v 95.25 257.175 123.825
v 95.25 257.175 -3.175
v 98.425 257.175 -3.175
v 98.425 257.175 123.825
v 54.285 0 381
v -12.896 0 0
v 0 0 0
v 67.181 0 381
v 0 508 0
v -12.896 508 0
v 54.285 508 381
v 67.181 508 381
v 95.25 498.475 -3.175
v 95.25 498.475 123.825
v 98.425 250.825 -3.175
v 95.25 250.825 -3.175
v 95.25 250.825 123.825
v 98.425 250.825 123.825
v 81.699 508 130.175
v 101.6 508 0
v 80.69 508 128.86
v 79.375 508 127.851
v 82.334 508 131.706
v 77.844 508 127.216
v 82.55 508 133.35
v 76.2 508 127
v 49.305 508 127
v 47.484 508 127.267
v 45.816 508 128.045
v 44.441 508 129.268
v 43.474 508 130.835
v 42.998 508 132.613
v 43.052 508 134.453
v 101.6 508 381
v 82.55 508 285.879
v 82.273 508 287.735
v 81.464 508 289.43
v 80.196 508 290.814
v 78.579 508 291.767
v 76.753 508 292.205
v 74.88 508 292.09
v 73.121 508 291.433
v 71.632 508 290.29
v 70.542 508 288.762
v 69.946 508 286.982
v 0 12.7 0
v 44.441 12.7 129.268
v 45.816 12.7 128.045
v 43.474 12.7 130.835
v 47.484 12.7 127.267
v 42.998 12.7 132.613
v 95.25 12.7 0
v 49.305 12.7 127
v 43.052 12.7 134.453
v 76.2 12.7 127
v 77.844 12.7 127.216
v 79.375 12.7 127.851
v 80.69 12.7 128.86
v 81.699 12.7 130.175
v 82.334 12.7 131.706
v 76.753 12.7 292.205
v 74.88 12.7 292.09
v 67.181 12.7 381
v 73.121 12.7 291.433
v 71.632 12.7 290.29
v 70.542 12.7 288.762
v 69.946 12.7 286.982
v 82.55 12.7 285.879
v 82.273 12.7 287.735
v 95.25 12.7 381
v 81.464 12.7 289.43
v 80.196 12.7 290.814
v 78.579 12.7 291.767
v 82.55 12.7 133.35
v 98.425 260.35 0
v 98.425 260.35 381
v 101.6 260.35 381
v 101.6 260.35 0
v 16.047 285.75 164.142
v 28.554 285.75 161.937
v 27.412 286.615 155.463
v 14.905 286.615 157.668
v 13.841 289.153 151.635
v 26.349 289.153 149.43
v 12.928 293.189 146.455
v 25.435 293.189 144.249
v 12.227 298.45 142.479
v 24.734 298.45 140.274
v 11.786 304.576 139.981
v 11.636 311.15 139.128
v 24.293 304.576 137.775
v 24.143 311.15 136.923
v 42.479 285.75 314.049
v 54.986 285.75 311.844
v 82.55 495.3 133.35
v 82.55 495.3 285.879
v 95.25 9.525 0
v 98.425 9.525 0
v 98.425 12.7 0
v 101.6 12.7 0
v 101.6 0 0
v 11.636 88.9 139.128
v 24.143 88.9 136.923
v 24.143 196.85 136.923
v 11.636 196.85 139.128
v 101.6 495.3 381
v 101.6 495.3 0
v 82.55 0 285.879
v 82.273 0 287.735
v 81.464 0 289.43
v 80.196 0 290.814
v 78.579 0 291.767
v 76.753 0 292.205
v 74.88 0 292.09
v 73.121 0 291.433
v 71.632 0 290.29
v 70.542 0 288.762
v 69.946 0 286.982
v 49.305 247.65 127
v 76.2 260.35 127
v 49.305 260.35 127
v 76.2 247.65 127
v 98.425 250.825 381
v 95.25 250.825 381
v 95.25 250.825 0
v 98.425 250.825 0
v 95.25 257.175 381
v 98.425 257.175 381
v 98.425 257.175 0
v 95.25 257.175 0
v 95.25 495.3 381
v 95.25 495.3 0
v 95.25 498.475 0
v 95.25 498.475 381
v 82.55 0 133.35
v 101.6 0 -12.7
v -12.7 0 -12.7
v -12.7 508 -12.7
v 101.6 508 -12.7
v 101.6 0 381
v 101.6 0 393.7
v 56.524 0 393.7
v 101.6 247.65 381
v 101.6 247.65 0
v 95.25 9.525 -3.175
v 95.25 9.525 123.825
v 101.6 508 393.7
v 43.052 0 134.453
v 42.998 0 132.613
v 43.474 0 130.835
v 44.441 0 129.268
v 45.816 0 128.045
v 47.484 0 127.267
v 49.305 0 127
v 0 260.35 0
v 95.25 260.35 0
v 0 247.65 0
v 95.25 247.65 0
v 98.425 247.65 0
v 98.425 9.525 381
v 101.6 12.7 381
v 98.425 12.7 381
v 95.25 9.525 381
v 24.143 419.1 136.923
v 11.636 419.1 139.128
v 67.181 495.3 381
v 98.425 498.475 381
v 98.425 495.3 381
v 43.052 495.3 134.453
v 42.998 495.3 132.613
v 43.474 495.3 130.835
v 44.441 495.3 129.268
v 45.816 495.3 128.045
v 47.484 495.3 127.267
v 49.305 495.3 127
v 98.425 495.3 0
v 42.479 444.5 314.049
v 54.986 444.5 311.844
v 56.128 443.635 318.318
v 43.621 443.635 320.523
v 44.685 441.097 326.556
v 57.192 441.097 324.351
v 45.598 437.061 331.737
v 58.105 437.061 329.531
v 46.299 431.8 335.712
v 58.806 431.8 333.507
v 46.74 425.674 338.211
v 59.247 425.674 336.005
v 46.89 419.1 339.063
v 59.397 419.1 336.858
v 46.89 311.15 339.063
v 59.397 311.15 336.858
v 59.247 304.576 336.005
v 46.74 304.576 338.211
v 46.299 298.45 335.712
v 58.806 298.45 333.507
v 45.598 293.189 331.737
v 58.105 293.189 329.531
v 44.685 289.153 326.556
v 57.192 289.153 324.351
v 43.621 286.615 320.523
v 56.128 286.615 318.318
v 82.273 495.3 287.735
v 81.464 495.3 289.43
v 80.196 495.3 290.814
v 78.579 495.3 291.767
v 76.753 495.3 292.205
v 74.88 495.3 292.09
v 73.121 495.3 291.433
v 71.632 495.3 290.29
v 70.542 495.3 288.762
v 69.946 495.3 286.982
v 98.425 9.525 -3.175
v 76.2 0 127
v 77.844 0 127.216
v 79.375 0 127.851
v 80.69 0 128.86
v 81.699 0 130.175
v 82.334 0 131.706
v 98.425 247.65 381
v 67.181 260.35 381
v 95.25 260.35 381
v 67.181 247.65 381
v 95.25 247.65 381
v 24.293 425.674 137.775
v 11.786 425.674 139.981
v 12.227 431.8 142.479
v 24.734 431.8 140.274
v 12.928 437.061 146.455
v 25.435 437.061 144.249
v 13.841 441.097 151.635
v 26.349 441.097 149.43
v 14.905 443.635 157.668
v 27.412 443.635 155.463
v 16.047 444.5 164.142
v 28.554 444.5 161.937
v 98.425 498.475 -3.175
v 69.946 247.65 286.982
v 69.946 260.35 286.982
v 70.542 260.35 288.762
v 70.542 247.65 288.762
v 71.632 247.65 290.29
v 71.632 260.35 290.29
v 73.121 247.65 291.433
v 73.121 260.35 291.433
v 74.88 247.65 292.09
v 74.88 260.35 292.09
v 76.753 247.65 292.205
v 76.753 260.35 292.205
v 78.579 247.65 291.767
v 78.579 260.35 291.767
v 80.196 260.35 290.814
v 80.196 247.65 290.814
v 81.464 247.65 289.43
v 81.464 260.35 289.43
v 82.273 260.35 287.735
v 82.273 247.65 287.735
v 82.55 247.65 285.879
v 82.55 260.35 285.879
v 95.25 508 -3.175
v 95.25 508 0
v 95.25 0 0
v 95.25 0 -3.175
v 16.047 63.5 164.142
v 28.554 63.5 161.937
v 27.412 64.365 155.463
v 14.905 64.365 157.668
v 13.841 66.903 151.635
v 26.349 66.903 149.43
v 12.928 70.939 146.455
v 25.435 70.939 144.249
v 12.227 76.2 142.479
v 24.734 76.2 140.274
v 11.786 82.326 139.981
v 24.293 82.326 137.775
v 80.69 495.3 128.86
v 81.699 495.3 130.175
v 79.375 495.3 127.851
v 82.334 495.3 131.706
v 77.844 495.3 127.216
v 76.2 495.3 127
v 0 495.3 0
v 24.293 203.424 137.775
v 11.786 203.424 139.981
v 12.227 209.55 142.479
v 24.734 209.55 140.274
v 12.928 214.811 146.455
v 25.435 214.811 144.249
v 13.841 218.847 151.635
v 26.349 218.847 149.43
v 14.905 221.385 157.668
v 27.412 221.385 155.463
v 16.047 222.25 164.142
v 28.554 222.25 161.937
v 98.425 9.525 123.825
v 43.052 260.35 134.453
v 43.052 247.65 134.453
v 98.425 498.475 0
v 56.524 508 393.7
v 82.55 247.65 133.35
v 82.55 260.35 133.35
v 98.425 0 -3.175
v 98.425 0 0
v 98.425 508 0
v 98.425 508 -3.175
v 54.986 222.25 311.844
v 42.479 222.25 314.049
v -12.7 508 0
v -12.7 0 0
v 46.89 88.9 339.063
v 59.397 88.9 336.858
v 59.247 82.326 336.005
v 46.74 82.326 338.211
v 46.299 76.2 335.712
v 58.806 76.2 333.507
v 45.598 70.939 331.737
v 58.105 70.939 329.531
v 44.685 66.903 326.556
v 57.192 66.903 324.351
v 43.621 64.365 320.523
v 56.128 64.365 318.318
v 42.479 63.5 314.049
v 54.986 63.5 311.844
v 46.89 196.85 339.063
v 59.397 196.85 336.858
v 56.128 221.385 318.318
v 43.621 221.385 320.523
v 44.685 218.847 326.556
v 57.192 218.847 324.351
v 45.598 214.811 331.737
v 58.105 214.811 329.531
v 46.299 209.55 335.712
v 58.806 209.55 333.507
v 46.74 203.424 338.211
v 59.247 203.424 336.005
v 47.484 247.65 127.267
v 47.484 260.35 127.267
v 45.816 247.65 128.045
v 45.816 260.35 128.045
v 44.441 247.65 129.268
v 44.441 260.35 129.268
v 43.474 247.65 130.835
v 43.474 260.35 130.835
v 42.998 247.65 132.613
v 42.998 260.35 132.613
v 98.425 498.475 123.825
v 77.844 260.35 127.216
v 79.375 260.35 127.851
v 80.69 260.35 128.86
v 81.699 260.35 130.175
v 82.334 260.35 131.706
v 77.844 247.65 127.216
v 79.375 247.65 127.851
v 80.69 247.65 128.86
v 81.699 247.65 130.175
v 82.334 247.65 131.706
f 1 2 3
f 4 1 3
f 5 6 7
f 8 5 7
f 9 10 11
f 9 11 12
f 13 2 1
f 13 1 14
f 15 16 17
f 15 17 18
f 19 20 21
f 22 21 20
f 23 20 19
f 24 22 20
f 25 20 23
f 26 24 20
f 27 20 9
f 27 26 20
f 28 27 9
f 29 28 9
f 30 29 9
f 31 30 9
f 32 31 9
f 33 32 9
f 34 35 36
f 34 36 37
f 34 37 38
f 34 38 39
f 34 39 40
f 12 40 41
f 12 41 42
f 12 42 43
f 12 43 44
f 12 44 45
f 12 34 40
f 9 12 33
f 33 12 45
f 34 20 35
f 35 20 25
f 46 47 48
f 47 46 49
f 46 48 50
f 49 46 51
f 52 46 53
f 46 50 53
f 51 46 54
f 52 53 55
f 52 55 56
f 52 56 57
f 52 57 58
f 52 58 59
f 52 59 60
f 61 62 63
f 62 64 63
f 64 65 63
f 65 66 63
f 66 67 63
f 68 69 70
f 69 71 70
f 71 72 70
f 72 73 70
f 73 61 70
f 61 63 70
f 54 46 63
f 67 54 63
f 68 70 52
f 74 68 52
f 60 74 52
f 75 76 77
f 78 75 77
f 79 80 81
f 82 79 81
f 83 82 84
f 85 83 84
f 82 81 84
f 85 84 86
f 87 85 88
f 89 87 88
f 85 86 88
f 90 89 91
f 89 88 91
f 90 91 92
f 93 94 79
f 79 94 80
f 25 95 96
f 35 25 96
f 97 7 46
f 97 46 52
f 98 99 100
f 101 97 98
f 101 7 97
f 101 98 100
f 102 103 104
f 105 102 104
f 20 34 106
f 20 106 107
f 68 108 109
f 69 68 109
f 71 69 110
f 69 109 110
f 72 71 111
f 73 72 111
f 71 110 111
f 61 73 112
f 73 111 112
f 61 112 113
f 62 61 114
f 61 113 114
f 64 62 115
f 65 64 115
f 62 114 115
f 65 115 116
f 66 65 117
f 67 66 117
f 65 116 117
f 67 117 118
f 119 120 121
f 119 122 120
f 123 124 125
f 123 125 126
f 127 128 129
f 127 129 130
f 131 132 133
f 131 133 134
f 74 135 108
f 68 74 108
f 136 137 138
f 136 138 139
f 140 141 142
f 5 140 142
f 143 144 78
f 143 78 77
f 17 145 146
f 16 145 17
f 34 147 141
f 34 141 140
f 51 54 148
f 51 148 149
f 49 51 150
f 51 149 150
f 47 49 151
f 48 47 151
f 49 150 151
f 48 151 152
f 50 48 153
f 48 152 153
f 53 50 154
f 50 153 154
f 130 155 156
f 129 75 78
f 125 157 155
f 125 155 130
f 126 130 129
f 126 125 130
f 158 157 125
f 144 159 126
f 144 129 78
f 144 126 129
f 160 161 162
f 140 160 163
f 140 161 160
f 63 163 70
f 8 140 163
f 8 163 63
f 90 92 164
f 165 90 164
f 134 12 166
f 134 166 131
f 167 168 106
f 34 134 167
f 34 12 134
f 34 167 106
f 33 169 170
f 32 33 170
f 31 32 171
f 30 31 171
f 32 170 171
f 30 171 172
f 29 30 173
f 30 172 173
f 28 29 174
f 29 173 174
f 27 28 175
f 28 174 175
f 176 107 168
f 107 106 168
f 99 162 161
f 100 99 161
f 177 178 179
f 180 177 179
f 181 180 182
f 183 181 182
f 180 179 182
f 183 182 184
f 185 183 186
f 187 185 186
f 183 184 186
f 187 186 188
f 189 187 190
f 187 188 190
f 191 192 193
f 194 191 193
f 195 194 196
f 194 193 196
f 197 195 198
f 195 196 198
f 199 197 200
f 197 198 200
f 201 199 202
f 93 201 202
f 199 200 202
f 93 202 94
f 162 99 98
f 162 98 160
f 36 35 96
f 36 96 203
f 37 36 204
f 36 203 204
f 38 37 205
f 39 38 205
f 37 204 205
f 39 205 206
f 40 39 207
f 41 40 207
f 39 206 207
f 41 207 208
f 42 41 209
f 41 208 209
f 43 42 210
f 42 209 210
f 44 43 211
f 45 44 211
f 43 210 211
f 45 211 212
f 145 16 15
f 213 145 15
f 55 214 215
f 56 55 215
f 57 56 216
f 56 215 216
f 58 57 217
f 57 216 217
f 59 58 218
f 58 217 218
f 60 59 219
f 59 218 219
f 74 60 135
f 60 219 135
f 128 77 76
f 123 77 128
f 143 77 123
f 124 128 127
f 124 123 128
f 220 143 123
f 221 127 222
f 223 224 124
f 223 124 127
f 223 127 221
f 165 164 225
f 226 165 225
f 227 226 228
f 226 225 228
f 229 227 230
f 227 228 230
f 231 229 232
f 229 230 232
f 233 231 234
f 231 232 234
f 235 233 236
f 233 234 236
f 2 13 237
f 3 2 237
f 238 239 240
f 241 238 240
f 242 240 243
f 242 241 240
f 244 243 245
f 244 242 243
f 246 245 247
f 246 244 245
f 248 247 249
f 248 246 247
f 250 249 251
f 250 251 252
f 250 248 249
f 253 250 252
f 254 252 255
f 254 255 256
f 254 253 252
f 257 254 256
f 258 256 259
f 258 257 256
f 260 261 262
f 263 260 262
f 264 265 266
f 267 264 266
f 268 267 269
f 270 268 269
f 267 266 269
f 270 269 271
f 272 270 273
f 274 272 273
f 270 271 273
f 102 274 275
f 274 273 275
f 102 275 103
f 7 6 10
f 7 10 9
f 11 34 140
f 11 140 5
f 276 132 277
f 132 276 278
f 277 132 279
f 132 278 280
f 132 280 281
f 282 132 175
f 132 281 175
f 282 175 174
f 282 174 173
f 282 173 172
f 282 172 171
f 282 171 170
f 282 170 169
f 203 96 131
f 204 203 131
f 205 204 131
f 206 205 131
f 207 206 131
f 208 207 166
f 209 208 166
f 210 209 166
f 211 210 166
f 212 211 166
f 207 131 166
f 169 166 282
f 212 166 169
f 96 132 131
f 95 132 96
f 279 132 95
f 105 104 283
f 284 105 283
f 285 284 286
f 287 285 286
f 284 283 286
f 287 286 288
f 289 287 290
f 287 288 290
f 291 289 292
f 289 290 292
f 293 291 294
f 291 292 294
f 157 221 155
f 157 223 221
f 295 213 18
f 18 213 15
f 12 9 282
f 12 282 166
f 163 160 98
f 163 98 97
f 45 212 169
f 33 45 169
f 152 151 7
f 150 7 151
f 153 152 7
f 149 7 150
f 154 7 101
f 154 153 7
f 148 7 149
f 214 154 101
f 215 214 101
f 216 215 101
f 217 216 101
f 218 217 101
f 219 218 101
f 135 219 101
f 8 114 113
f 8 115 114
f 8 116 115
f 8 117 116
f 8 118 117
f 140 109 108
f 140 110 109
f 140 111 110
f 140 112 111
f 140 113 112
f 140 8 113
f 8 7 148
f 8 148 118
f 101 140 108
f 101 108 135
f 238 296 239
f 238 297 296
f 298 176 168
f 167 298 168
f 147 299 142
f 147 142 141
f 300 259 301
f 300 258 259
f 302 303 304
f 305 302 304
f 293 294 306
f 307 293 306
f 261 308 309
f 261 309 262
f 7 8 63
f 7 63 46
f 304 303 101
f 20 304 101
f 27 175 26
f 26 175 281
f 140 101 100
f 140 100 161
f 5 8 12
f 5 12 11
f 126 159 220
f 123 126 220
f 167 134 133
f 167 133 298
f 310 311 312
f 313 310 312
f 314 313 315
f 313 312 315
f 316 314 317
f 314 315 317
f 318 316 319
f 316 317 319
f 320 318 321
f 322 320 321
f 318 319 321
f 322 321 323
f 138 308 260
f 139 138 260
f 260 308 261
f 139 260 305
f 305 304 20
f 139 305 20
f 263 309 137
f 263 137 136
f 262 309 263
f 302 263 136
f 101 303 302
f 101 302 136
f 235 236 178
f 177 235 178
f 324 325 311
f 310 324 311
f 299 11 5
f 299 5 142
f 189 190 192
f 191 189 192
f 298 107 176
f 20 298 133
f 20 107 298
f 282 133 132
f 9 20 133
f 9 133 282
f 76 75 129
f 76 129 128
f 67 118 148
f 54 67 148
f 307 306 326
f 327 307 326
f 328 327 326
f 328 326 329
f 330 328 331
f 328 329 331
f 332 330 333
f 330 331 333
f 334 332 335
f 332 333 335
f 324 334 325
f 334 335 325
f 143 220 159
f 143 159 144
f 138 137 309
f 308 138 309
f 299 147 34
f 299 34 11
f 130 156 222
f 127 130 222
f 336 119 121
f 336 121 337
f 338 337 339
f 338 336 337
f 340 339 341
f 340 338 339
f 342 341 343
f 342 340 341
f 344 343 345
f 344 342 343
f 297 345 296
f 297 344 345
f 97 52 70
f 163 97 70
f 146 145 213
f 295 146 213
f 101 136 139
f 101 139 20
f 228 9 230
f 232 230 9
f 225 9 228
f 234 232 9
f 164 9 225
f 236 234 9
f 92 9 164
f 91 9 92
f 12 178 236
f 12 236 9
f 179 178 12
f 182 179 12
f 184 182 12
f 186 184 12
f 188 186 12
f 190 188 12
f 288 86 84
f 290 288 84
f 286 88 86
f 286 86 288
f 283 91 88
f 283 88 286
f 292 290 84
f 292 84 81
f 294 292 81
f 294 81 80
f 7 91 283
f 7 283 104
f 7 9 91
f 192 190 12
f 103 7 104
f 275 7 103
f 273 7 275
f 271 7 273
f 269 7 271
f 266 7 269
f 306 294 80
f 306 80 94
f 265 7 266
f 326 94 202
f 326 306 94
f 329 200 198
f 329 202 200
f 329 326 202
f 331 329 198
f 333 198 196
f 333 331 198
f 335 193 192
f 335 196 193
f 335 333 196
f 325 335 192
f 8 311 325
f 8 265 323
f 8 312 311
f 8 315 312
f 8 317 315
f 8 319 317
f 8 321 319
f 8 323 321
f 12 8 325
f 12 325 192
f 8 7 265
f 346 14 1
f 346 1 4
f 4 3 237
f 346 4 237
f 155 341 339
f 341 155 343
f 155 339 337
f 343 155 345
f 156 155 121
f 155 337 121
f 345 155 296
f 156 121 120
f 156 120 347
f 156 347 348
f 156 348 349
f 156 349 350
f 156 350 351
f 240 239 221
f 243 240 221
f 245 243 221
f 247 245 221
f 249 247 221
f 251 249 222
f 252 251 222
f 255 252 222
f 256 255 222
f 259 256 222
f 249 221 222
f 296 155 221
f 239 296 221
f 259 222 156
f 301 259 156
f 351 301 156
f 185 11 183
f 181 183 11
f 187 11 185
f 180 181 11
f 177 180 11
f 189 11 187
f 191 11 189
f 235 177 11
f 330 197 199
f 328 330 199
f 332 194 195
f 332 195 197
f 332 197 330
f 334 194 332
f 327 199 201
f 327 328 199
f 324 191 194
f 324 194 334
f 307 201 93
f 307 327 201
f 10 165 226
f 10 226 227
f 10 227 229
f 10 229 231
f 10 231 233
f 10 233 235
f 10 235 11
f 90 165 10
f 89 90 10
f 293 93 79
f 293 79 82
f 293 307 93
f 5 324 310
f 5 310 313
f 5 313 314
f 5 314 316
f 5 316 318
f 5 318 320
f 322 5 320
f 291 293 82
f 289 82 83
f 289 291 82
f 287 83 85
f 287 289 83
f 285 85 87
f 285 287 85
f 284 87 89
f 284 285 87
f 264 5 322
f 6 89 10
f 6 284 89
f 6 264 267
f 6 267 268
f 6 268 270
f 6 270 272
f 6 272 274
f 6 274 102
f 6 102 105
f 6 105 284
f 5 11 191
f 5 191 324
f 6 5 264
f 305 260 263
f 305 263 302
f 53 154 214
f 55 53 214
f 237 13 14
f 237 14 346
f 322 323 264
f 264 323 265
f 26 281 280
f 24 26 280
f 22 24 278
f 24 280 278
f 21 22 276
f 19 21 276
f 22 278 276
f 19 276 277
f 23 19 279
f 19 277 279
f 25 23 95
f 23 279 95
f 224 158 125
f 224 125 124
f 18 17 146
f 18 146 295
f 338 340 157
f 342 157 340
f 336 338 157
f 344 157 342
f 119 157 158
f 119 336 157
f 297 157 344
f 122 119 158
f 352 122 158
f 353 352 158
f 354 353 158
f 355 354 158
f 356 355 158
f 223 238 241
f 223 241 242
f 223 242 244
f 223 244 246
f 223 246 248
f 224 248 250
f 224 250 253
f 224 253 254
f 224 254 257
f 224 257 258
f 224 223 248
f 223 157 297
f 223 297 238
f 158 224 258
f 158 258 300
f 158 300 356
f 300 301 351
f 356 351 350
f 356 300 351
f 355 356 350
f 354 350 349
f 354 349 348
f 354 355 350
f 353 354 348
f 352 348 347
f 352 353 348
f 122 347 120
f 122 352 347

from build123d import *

# Parameters (mm, degrees)
F1_DEPTH  = 12.7
F2_W      = 114.3
F2_H      = 12.7
F3_DEPTH  = 508
F5_DEPTH  = 12.7
F7_DEPTH  = 508
F9_DEPTH  = 508
F10_W     = 3.175
F10_H     = 381
F11_DEPTH = 3.175
F12_W     = 3.175
F12_H     = 381
F13_DEPTH = 3.175
F16_DEPTH = 6.35
F17_W     = 3.175
F17_H     = 381
F18_DEPTH = 3.175
F19_W     = 3.175
F19_H     = 381
F20_DEPTH = 3.175
F22_DEPTH = 3.175
F23_W     = 3.175
F23_H     = 241.3
F24_DEPTH = 127
F26_DEPTH = 508.001
F28_DEPTH = 81.0662875475


with BuildPart() as f1:
    # F0 (on Front) → F1 (new body)
    with BuildSketch(Plane.XZ):
        Polygon((67.1805796499, 381), (0, 0), (101.6, 0), (101.6, 381), align=None)
    extrude(amount=-F1_DEPTH)

    # F10 (on face) → F11 (cut)
    with BuildSketch(Plane(origin=(0, 12.7, 0), x_dir=(-1, 0, 0), z_dir=(0, 1, 0))):
        with Locations((-96.8375, 190.5)):
            Rectangle(F10_W, F10_H)
    extrude(amount=-F11_DEPTH, mode=Mode.SUBTRACT)


with BuildPart() as f3:
    # F2 (on face) → F3 (new body)
    with BuildSketch(Plane.XZ):
        with Locations((44.45, -6.35)):
            Rectangle(F2_W, F2_H)
    extrude(amount=-F3_DEPTH)

    # F21 (on face) → F22 (cut)
    with BuildSketch(Plane.XY):
        Polygon((95.25, 508), (95.25, 498.475), (95.25, 9.525), (95.25, 0), (98.425, 0), (98.425, 9.525), (98.425, 498.475), (98.425, 508), align=None)
    extrude(amount=-F22_DEPTH, mode=Mode.SUBTRACT)


with BuildPart() as f5:
    # F4 (on face) → F5 (new body)
    with BuildSketch(Plane(origin=(0, 508, 0), x_dir=(-1, 0, 0), z_dir=(0, 1, 0))):
        Polygon((0, 0), (-67.1805796499, 381), (-101.6, 381), (-101.6, 0), align=None)
    extrude(amount=-F5_DEPTH)

    # F12 (on face) → F13 (cut)
    with BuildSketch(Plane.XZ.offset(-495.3)):
        with Locations((96.8375, 190.5)):
            Rectangle(F12_W, F12_H)
    extrude(amount=-F13_DEPTH, mode=Mode.SUBTRACT)


with BuildPart() as f7:
    # F6 (on face) → F7 (new body, through all)
    with BuildSketch(Plane.XZ):
        Polygon((0, 0), (67.1805796499, 381), (54.284661679, 381), (-12.8959179709, 0), align=None)
    extrude(amount=-F7_DEPTH)

    # F27 (on face) → F28 (cut, through all)
    with BuildSketch(Plane(origin=(0, 0, 0), x_dir=(0, 1, 0), z_dir=(0.984807753, 0, -0.1736481777))):
        with BuildLine():
            Line((196.85, 342.0544087486), (88.9, 342.0544087486))
            ThreePointArc((88.9, 342.0544087486), (70.9394877579, 334.6149209907), (63.5, 316.6544087486))
            Line((63.5, 316.6544087486), (63.5, 164.4351419036))
            ThreePointArc((63.5, 164.4351419036), (70.9394877579, 146.4746296615), (88.9, 139.0351419036))
            Line((88.9, 139.0351419036), (196.85, 139.0351419036))
            ThreePointArc((196.85, 139.0351419036), (214.8105122421, 146.4746296615), (222.25, 164.4351419036))
            Line((222.25, 164.4351419036), (222.25, 316.6544087486))
            ThreePointArc((222.25, 316.6544087486), (214.8105122421, 334.6149209907), (196.85, 342.0544087486))
        make_face()
        with BuildLine():
            ThreePointArc((311.15, 342.0544087486), (293.1894877579, 334.6149209907), (285.75, 316.6544087486))
            Line((285.75, 316.6544087486), (285.75, 164.4351419036))
            ThreePointArc((285.75, 164.4351419036), (293.1894877579, 146.4746296615), (311.15, 139.0351419036))
            Line((311.15, 139.0351419036), (419.1, 139.0351419036))
            ThreePointArc((419.1, 139.0351419036), (437.0605122421, 146.4746296615), (444.5, 164.4351419036))
            Line((444.5, 164.4351419036), (444.5, 316.6544087486))
            ThreePointArc((444.5, 316.6544087486), (437.0605122421, 334.6149209907), (419.1, 342.0544087486))
            Line((419.1, 342.0544087486), (311.15, 342.0544087486))
        make_face()
    extrude(amount=-F28_DEPTH, mode=Mode.SUBTRACT)


with BuildPart() as f9:
    # F8 (on face) → F9 (new body, through all)
    with BuildSketch(Plane(origin=(0, 508, 0), x_dir=(-1, 0, 0), z_dir=(0, 1, 0))):
        Polygon((-101.6, 393.7), (-101.6, 381), (-54.284661679, 381), (-56.524014334, 393.7), align=None)
    extrude(amount=-F9_DEPTH)


with BuildPart() as f16:
    # F15 (on mid) → F16 (new body, symmetric)
    with BuildSketch(Plane.XZ.offset(-254)):
        Polygon((67.1805796499, 381), (0, 0), (101.6, 0), (101.6, 381), align=None)
        with BuildLine():
            ThreePointArc((49.3050388194, 127), (44.4406566056, 129.2682986785), (43.0515095877, 134.4526659282))
            Line((43.0515095877, 134.4526659282), (69.9464707684, 286.9815703112))
            ThreePointArc((69.9464707684, 286.9815703112), (76.7534389664, 292.2047407159), (82.55, 285.878904383))
            Line((82.55, 285.878904383), (82.55, 133.35))
            ThreePointArc((82.55, 133.35), (80.6901280605, 128.8598719395), (76.2, 127))
            Line((76.2, 127), (49.3050388194, 127))
        make_face(mode=Mode.SUBTRACT)
    extrude(amount=F16_DEPTH, both=True)

    # F17 (on face) → F18 (cut)
    with BuildSketch(Plane.XZ.offset(-247.65)):
        with Locations((96.8375, 190.5)):
            Rectangle(F17_W, F17_H)
    extrude(amount=-F18_DEPTH, mode=Mode.SUBTRACT)

    # F19 (on face) → F20 (cut)
    with BuildSketch(Plane(origin=(0, 260.35, 0), x_dir=(-1, 0, 0), z_dir=(0, 1, 0))):
        with Locations((-96.8375, 190.5)):
            Rectangle(F19_W, F19_H)
    extrude(amount=-F20_DEPTH, mode=Mode.SUBTRACT)


with BuildPart() as f24:
    # F23 (on face) → F24 (new body)
    with BuildSketch(Plane.XY.offset(-3.175)):
        with Locations((96.8375, 377.825)):
            Rectangle(F23_W, F23_H)
    extrude(amount=F24_DEPTH)


with BuildPart() as f24b:
    # F23 (on face) → F24, piece 2 (new body)
    with BuildSketch(Plane.XY.offset(-3.175)):
        with Locations((96.8375, 130.175)):
            Rectangle(F23_W, F23_H)
    extrude(amount=F24_DEPTH)


with BuildPart() as f26_tool:
    # F25 (on face) → F26 (new body, through all)
    with BuildSketch(Plane.XZ):
        with BuildLine():
            Line((69.9464707684, 286.9815703112), (43.0515095877, 134.4526659282))
            ThreePointArc((43.0515095877, 134.4526659282), (44.4406566056, 129.2682986785), (49.3050388194, 127))
            Line((49.3050388194, 127), (76.2, 127))
            ThreePointArc((76.2, 127), (80.6901280605, 128.8598719395), (82.55, 133.35))
            Line((82.55, 133.35), (82.55, 285.878904383))
            ThreePointArc((82.55, 285.878904383), (76.7534389664, 292.2047407159), (69.9464707684, 286.9815703112))
        make_face()
    extrude(amount=-F26_DEPTH)


with BuildPart() as f1_1:
    add(f1.part)

    # F26: cut by f26_tool
    add(f26_tool.part, mode=Mode.SUBTRACT)


with BuildPart() as f5_1:
    add(f5.part)

    # F26: cut by f26_tool
    add(f26_tool.part, mode=Mode.SUBTRACT)


solid = Compound([f3.part, f7.part, f9.part, f16.part, f24.part, f24b.part, f1_1.part, f5_1.part])
